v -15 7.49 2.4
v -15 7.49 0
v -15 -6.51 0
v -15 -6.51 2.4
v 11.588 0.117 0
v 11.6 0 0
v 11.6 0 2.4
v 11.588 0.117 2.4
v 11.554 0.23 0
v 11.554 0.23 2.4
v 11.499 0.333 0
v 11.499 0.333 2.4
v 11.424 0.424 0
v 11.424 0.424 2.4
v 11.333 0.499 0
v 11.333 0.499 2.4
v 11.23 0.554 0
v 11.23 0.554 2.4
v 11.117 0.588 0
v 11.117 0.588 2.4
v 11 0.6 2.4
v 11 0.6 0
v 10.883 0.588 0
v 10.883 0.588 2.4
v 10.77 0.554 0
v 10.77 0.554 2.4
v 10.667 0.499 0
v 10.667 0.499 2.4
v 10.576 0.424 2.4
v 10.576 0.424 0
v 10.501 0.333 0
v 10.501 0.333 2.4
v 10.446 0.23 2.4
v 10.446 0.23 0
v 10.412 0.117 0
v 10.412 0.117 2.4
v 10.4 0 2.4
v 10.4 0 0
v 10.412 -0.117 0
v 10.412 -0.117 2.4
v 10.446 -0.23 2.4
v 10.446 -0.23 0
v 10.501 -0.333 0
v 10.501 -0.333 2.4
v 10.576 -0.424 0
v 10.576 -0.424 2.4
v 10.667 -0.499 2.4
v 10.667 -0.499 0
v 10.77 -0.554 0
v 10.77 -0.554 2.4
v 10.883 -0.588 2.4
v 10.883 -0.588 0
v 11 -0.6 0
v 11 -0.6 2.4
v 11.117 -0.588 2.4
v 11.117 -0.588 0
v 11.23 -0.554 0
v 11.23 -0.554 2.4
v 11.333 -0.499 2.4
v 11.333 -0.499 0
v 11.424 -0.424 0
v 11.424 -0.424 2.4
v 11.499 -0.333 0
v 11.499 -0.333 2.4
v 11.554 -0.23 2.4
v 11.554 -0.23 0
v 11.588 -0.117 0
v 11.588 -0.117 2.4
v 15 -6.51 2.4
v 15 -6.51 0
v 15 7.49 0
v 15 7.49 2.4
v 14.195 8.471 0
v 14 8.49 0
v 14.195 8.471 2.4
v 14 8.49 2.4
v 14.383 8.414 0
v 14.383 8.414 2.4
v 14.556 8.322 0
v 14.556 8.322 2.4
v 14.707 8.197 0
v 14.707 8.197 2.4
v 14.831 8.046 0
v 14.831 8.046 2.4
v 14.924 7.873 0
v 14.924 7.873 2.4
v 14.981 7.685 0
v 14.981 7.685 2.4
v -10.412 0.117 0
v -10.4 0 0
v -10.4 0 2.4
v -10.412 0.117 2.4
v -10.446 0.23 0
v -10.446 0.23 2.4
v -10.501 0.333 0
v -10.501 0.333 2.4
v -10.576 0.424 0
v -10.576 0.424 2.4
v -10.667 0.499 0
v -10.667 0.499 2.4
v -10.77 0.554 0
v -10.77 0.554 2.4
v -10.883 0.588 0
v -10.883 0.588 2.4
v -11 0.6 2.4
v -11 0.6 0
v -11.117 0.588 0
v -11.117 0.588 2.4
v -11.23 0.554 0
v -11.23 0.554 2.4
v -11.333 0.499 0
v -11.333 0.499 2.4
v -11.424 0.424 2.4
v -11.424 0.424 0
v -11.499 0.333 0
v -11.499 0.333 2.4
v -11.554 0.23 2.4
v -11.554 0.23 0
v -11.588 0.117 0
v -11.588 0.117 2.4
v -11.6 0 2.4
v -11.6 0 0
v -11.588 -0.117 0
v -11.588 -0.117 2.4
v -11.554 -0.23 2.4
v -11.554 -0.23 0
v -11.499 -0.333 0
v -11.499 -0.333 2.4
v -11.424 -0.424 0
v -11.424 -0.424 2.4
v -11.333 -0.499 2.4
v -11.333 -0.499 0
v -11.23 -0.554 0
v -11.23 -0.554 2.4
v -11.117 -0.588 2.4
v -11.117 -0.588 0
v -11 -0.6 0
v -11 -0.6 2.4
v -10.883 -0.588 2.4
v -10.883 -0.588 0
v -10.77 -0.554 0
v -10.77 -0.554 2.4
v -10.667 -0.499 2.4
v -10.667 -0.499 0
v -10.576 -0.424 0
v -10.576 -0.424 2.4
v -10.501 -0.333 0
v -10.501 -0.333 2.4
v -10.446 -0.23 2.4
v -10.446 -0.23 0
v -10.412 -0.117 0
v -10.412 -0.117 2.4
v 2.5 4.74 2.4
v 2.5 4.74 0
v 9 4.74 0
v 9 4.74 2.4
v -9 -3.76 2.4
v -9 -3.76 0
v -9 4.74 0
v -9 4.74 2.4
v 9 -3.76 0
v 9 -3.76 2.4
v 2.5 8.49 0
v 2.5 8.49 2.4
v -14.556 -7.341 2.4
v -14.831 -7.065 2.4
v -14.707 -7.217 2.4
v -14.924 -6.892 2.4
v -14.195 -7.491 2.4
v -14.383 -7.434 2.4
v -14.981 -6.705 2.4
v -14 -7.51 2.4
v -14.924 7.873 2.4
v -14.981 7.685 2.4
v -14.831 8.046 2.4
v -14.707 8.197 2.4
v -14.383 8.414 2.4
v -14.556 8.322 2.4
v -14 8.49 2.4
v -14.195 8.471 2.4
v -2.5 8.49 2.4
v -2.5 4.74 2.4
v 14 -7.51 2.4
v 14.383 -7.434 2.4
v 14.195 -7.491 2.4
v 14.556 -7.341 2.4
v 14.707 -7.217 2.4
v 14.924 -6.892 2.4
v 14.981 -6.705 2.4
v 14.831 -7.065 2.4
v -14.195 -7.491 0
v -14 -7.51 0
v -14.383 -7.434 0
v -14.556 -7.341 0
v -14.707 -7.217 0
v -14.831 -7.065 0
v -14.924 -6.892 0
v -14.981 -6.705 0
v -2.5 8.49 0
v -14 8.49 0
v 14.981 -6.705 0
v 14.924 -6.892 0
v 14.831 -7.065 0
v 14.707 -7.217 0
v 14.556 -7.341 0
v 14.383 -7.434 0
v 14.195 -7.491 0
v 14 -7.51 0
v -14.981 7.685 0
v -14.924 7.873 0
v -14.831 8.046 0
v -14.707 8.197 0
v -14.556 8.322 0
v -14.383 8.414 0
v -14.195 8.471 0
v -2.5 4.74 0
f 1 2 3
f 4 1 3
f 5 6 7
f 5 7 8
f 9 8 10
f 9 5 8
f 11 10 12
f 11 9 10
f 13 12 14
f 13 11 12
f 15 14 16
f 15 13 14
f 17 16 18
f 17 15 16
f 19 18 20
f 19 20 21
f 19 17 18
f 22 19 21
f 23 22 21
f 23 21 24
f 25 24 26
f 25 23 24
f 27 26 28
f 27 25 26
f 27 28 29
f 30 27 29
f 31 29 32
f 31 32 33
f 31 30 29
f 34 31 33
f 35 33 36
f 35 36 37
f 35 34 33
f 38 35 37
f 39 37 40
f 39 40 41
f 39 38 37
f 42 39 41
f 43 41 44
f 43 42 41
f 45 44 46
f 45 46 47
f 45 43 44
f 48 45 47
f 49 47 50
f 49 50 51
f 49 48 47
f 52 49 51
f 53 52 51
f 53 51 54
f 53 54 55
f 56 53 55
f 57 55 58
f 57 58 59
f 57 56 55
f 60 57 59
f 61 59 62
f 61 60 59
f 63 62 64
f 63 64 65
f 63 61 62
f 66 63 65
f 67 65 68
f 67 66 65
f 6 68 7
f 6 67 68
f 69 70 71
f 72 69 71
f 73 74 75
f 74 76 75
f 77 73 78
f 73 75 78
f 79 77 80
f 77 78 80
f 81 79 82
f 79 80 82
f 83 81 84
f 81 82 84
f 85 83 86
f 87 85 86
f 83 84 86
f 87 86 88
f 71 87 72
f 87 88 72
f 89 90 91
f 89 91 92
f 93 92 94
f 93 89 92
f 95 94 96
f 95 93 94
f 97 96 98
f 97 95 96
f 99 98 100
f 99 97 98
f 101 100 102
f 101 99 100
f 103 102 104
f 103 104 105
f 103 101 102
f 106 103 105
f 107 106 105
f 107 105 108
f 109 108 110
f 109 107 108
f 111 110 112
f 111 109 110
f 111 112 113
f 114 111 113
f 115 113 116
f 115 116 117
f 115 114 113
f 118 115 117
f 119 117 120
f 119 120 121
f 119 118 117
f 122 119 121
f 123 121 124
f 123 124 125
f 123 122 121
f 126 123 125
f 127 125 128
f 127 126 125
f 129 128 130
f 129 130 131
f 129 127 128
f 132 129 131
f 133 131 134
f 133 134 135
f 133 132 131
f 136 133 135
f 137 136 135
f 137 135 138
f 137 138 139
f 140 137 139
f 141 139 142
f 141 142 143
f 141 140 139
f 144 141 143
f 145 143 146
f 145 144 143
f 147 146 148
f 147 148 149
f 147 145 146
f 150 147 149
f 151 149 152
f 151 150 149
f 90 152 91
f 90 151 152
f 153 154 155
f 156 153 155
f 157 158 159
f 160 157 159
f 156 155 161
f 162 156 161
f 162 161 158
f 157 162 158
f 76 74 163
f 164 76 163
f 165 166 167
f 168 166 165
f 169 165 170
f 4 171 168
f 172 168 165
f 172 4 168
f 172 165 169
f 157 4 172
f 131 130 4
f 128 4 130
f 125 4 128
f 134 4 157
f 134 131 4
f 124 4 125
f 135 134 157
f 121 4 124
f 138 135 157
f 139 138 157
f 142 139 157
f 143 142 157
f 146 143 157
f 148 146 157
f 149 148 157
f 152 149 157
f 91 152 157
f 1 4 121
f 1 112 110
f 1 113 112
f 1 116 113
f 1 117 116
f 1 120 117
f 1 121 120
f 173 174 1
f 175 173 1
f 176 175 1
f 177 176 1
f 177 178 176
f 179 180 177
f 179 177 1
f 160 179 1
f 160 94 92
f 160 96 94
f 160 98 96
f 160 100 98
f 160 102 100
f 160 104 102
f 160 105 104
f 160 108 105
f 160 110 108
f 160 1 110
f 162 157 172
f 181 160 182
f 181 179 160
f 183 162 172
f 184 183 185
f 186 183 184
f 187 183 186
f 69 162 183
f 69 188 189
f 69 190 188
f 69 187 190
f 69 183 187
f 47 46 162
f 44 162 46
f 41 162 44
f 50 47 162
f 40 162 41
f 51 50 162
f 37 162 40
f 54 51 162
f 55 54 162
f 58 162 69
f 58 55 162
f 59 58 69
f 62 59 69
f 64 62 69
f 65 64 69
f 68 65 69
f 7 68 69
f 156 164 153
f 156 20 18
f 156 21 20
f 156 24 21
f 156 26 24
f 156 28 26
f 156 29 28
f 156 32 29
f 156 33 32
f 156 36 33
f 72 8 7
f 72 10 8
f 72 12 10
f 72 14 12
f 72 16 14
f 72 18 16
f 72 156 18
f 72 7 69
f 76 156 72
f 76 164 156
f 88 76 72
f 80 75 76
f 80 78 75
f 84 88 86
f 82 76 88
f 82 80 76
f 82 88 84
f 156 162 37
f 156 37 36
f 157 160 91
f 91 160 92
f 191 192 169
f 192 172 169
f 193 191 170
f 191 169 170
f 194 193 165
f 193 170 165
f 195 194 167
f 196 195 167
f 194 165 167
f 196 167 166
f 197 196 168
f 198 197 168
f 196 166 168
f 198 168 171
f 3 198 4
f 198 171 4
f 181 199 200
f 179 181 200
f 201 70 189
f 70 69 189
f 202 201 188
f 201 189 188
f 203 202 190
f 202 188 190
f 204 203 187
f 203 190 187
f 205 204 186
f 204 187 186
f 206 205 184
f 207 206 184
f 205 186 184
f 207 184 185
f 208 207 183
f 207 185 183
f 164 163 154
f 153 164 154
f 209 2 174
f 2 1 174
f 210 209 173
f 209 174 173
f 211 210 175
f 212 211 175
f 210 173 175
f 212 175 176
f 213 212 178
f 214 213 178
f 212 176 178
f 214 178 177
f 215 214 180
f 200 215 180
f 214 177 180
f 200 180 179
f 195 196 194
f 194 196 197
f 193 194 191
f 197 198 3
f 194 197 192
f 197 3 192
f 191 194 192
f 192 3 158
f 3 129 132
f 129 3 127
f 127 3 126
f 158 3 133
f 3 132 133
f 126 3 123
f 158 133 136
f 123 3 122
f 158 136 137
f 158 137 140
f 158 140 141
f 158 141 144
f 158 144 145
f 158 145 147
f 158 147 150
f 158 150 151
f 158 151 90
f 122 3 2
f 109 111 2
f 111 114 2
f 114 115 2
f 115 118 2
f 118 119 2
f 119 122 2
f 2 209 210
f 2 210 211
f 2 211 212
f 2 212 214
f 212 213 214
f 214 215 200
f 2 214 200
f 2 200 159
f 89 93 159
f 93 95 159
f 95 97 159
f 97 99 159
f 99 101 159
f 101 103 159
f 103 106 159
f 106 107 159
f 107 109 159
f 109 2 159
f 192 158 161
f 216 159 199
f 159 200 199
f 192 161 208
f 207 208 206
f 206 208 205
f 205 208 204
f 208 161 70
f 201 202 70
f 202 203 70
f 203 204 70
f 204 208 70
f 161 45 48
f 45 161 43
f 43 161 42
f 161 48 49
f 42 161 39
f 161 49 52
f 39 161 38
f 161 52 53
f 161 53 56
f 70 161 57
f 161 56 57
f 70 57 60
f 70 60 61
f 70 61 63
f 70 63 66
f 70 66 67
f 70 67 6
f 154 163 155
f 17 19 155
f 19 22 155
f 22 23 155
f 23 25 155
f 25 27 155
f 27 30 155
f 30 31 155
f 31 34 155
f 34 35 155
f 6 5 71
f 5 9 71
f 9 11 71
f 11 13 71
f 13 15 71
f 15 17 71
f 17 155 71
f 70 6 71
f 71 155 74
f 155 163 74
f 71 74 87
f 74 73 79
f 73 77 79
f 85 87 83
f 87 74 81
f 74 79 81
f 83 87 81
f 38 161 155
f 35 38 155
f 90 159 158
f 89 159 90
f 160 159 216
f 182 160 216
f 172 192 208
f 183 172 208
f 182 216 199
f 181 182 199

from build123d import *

# Parameters (mm, degrees)
F0_R     = 0.6
F1_DEPTH = 2.4
F2_R     = 1


with BuildPart() as f1:
    # F0 (on Top) → F1 (new body)
    with BuildSketch(Plane.XY):
        Polygon((2.5, 8.490209), (2.5, 4.740209), (9, 4.740209), (9, -3.759791), (0, -3.759791), (-9, -3.759791), (-9, 4.740209), (-2.5, 4.740209), (-2.5, 8.490209), (-15, 8.490209), (-15, -7.509791), (0, -7.509791), (15, -7.509791), (15, 8.490209), align=None)
        with Locations((-11, 0)):
            Circle(F0_R, mode=Mode.SUBTRACT)
        with Locations((11, 0)):
            Circle(F0_R, mode=Mode.SUBTRACT)
    extrude(amount=F1_DEPTH)

    # F2
    f2_edges = [f1.edges().sort_by_distance(p)[0] for p in [
        (15, 8.490209, 1.2),
        (15, -7.509791, 1.2),
        (-15, 8.490209, 1.2),
        (-15, -7.509791, 1.2),
    ]]
    fillet(f2_edges, radius=F2_R)


solid = f1.part
